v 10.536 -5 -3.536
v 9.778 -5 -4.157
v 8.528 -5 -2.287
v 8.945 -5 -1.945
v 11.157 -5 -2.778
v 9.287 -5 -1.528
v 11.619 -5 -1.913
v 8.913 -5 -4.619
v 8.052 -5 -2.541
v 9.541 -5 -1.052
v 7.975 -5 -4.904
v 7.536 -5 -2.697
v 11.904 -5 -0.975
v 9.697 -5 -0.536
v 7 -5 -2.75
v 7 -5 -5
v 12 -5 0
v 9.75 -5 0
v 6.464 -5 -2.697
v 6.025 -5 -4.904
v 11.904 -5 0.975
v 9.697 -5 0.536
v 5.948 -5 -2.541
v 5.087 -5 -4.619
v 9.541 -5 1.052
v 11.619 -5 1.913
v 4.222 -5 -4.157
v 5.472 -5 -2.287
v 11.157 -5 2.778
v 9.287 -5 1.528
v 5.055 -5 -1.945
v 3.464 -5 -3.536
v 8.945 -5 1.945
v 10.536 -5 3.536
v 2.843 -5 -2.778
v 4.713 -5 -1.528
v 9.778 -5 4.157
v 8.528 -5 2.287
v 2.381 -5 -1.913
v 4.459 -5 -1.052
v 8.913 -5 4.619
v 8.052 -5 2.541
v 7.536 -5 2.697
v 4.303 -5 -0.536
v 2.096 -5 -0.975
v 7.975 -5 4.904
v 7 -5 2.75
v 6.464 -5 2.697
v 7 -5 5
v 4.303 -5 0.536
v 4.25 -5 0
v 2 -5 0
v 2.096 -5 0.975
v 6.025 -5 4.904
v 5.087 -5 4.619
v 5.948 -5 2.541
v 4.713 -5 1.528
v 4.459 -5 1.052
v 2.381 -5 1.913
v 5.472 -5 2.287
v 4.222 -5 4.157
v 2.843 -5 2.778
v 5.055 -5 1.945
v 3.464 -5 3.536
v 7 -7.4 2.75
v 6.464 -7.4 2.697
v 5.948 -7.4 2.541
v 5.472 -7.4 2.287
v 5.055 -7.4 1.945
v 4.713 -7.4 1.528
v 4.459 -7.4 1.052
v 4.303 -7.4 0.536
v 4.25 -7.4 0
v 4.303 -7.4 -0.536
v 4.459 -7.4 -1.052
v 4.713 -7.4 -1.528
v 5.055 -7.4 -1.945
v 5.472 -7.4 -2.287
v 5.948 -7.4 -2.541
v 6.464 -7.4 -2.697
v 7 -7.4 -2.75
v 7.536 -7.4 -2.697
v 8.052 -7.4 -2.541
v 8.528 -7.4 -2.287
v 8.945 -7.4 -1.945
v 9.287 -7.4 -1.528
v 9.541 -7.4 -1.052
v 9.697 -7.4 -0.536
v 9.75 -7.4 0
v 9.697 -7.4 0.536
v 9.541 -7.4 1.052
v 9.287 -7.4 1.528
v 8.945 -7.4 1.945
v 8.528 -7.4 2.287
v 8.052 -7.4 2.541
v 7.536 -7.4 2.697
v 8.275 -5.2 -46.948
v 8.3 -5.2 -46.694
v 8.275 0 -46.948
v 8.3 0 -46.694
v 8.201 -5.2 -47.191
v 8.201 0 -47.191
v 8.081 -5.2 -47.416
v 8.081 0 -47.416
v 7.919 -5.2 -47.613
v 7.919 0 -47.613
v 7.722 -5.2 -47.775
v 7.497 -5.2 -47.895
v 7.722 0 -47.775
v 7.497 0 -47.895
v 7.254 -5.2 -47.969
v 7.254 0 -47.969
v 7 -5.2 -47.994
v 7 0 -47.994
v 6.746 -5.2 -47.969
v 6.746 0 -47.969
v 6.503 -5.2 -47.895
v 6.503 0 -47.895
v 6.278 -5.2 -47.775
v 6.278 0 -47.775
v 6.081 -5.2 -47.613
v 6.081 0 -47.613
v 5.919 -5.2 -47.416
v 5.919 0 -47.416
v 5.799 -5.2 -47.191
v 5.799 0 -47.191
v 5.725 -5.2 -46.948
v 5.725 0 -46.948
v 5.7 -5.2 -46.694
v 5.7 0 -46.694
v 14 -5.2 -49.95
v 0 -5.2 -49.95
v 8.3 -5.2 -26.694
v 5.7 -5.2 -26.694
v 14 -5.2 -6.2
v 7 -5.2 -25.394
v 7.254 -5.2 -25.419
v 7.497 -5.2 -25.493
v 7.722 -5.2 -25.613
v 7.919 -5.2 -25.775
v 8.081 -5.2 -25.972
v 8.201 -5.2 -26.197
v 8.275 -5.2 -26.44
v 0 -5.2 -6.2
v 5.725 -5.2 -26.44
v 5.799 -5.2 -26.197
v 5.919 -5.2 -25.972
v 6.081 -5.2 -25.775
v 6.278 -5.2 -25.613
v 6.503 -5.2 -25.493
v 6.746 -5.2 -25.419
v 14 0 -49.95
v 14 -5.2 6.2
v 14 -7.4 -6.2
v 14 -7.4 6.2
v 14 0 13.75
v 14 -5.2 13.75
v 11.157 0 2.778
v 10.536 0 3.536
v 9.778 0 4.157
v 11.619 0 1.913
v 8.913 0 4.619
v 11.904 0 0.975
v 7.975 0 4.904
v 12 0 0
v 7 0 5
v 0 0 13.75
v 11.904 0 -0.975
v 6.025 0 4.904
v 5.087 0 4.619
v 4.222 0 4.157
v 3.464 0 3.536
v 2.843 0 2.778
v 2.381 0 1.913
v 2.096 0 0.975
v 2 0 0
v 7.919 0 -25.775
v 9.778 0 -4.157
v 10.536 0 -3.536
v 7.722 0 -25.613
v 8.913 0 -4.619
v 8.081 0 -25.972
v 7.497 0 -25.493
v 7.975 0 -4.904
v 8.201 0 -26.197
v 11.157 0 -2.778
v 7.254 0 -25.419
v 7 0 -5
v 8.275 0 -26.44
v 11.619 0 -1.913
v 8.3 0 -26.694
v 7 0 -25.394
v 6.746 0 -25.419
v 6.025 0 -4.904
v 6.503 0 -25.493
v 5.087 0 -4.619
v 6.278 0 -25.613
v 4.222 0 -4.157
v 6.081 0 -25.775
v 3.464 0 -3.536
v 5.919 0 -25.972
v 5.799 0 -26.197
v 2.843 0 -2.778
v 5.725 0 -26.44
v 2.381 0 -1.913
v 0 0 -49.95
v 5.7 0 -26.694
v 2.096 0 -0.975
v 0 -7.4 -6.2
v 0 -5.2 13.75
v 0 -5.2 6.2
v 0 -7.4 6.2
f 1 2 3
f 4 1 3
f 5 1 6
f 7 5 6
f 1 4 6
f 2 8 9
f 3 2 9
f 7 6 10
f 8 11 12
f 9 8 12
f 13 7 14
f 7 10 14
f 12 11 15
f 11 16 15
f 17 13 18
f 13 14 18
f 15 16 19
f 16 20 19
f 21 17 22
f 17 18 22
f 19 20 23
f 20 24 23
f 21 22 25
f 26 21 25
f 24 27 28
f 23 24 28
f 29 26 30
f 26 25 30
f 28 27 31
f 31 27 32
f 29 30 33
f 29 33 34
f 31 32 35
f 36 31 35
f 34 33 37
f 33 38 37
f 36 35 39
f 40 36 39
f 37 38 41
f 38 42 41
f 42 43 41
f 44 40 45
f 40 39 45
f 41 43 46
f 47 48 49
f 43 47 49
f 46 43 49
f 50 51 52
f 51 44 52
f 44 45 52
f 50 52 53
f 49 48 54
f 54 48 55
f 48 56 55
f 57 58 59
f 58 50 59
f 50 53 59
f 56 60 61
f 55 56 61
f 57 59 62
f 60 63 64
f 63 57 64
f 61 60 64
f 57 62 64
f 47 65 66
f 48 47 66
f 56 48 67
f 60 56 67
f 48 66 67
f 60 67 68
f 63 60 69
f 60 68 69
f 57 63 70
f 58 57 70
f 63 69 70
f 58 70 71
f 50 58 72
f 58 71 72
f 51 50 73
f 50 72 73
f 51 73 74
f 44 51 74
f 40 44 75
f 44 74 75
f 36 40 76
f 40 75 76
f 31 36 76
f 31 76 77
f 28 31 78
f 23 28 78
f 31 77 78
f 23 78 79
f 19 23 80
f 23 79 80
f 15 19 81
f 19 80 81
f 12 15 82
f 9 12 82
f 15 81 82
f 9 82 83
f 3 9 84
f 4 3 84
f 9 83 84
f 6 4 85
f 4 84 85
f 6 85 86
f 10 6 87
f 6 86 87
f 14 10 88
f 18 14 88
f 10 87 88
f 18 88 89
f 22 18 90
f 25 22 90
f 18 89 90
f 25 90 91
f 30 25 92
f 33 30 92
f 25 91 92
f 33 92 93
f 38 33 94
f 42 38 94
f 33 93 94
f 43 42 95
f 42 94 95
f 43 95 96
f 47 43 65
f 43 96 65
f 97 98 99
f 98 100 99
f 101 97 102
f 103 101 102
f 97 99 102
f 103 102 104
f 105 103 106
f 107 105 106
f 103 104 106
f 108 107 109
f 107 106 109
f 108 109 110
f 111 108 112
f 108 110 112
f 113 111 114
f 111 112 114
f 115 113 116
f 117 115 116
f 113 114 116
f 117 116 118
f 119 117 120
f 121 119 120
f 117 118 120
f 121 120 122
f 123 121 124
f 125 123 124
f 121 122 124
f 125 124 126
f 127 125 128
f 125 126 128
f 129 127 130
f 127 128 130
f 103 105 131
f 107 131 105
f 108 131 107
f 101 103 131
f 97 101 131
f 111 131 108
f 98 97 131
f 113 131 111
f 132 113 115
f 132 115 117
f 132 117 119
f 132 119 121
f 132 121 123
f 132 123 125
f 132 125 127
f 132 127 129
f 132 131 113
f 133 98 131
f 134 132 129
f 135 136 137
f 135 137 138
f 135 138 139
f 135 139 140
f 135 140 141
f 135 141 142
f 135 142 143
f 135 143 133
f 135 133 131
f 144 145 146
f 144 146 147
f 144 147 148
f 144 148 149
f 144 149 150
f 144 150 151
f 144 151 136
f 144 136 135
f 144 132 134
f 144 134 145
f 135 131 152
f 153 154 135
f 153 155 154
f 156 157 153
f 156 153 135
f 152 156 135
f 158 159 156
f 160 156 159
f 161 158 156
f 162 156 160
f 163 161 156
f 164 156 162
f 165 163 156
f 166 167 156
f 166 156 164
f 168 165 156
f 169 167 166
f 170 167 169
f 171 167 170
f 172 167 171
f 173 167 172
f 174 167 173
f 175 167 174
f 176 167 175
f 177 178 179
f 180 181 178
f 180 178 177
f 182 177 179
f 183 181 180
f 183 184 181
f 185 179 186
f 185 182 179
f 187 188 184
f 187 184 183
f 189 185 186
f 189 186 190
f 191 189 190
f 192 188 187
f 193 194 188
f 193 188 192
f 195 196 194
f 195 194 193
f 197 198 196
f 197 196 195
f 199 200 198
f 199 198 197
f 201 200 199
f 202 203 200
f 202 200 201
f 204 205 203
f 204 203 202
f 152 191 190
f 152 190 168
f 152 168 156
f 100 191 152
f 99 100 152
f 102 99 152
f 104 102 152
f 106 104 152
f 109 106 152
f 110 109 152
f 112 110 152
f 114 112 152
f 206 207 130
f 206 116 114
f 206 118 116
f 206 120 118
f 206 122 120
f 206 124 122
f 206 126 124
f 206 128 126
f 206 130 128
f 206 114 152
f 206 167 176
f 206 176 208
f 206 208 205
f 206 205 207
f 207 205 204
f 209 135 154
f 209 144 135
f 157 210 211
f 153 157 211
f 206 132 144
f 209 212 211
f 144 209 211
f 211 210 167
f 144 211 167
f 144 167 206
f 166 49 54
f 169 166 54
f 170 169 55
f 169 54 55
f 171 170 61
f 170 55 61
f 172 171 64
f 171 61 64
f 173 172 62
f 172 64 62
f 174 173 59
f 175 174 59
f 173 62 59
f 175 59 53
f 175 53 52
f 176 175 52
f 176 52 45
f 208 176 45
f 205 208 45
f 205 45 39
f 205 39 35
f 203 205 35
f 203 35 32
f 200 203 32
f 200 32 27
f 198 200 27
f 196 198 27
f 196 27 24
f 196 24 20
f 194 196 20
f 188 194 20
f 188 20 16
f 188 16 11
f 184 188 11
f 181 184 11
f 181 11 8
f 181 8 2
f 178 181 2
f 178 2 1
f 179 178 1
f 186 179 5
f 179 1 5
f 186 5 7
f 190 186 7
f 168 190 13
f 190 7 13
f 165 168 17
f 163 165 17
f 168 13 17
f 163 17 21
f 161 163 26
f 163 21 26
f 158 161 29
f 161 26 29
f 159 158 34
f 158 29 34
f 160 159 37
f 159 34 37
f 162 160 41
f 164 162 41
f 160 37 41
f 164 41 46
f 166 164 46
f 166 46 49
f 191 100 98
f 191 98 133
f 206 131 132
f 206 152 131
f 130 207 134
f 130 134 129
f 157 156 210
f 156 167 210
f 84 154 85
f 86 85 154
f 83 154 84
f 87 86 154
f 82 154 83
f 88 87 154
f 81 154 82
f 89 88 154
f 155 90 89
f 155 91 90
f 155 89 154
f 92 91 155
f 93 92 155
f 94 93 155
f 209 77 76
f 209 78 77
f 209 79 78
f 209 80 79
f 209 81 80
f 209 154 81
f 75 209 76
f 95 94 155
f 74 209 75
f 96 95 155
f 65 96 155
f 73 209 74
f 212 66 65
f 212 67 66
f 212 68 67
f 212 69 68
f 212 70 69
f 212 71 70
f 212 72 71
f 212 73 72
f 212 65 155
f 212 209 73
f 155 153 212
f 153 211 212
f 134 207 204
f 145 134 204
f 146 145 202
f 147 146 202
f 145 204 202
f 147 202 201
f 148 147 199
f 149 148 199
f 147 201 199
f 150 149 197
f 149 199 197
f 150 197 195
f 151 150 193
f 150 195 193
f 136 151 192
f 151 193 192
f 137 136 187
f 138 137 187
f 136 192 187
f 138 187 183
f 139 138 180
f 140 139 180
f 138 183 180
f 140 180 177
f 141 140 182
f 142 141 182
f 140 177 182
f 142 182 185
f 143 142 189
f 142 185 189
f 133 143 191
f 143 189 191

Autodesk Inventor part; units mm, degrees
ref_plane "YZ Plane" through (0, 0, 0) normal (1, 0, 0) x (0, 1, 0)
ref_plane "XZ Plane" through (0, 0, 0) normal (0, 1, 0) x (-1, 0, 0)
ref_plane "XY Plane" through (0, 0, 0) normal (0, 0, 1) x (1, 0, 0)
sketch "Sketch1" plane through (0, 0, 0) normal (1, 0, 0) x (0, 1, 0)
  line L0 (0, 13.75) -> (-5.2, 13.75)
  line L1 (-5.2, 13.75) -> (-5.2, 6.2)
  line L2 (-5.2, 6.2) -> (-7.4, 6.2)
  line L3 (-7.4, 6.2) -> (-7.4, 2.5)
  line L4 (-7.4, 2.5) -> (-13.4, 2.5) construction
  line L5 (-13.4, 2.5) -> (-13.4, -1.6142) construction
  line L6 (-16.08, 0) -> (2.68, 0) construction
  line L7 (0, -13.75) -> (-5.2, -13.75)
  line L8 (-5.2, -13.75) -> (-5.2, -6.2)
  line L9 (-5.2, -6.2) -> (-7.4, -6.2)
  line L10 (-7.4, -6.2) -> (-7.4, -2.5)
  line L11 (-7.4, -2.5) -> (-13.4, -2.5) construction
  line L12 (-13.4, -2.5) -> (-13.4, -1.6142) construction
  line L13 (0, 13.75) -> (0, -13.75)
  line L14 (-7.4, 2.5) -> (-7.4, -2.5)
  point P0 (0, 0)
  dimension "d1" = 5
  dimension "d2" = 3.7
  dimension "d3" = 6
  dimension "d4" = 2.2
  dimension "d5" = 5.2
  dimension "d52" = 27.5
  dimension "d53" = 7.55
extrude "Extrusion1" add sketch "Sketch1" along normal blind 14
sketch "Sketch2" plane through (0, -5.2, -13.75) normal (0, 0, -1) x (-1, 0, 0)
  line L0 (0, 0) -> (0, 5.2) projected
  line L1 (0, 5.2) -> (-14, 5.2) projected
  line L2 (-14, 0) -> (-14, 5.2) projected
  line L3 (0, 0) -> (-14, 0) projected
  point P0 (0, 5.2)
sketch "Sketch3" plane through (0, 0, 13.75) normal (0, 1, 0) x (1, 0, 0)
  line L0 (0, 0) -> (14, 0) construction
  line L1 (7, 40.444) -> (7, 60.444) construction
  line L2 (5.7, 40.444) -> (5.7, 60.444)
  line L3 (8.3, 60.444) -> (8.3, 40.444)
  arc A0 (5.7, 40.444) -> (8.3, 40.444) centre (7, 40.444) ccw
  arc A1 (8.3, 60.444) -> (5.7, 60.444) centre (7, 60.444) ccw
  line L4 (0, 69.5) -> (41.7053, 69.5) construction
  circle A2 centre (7, 61.2) radius 2.5 construction
  line L5 (0, 63.7) -> (21.4479, 63.7) construction
  line L6 (-0.0005, 67.5) -> (30.8862, 67.5) construction
  line L7 (0, 27.5) -> (0, 0) construction
  line L8 (7, 0) -> (7, 40.444) construction
  point P0 (7, 50.444)
  dimension "d55" = 2.6
  dimension "d57" = 42
  dimension "d58" = 0.756
  dimension "d59" = 5
  dimension "d60" = 3.8
  dimension "d61" = 2
  dimension "d62" = 20
ref_plane "Work Plane2" through (0, 0, -49.95) normal (0, 0, -1) x (-1, 0, 0)
extrude "Extrusion8" add sketch "Sketch2" along normal up to surface (36.2 mm away)
extrude "Extrusion7" cut sketch "Sketch3" against normal through all
sketch "Sketch5" plane through (0, 0, 13.75) normal (0, 1, 0) x (1, 0, 0)
  point P0 (0, 13.75)
ref_plane "Work Plane1" through (0, -2, 13.75) normal (0, 1, 0) x (1, 0, 0)
sketch "Sketch7" plane through (0, 0, 13.75) normal (0, 1, 0) x (1, 0, 0)
  line L0 (18.6924, 13.75) -> (-14.1545, 13.75) construction
  circle A0 centre (7, 13.75) radius 4.5
  line L1 (14, 0) -> (14, 63.7)
  line L2 (0, 0) -> (14, 0) construction
  line L3 (14, 63.7) -> (-7.462, 63.7) construction
  line L4 (7, 0) -> (7, 13.75) construction
  point P0 (0, 13.75)
  point P1 (3.3, 22.5)
  dimension "d24" = 9
hole "Hole1" at (7, 0, 0) direction (0, -1, 0) diameter 5.5 end through all counterbore diameter 10 counterbore depth 5 clearance for "Socket Head Cap Screw ISO 4762" size "M5" standard "ISO"
properties part number "Sensor_Montage"
